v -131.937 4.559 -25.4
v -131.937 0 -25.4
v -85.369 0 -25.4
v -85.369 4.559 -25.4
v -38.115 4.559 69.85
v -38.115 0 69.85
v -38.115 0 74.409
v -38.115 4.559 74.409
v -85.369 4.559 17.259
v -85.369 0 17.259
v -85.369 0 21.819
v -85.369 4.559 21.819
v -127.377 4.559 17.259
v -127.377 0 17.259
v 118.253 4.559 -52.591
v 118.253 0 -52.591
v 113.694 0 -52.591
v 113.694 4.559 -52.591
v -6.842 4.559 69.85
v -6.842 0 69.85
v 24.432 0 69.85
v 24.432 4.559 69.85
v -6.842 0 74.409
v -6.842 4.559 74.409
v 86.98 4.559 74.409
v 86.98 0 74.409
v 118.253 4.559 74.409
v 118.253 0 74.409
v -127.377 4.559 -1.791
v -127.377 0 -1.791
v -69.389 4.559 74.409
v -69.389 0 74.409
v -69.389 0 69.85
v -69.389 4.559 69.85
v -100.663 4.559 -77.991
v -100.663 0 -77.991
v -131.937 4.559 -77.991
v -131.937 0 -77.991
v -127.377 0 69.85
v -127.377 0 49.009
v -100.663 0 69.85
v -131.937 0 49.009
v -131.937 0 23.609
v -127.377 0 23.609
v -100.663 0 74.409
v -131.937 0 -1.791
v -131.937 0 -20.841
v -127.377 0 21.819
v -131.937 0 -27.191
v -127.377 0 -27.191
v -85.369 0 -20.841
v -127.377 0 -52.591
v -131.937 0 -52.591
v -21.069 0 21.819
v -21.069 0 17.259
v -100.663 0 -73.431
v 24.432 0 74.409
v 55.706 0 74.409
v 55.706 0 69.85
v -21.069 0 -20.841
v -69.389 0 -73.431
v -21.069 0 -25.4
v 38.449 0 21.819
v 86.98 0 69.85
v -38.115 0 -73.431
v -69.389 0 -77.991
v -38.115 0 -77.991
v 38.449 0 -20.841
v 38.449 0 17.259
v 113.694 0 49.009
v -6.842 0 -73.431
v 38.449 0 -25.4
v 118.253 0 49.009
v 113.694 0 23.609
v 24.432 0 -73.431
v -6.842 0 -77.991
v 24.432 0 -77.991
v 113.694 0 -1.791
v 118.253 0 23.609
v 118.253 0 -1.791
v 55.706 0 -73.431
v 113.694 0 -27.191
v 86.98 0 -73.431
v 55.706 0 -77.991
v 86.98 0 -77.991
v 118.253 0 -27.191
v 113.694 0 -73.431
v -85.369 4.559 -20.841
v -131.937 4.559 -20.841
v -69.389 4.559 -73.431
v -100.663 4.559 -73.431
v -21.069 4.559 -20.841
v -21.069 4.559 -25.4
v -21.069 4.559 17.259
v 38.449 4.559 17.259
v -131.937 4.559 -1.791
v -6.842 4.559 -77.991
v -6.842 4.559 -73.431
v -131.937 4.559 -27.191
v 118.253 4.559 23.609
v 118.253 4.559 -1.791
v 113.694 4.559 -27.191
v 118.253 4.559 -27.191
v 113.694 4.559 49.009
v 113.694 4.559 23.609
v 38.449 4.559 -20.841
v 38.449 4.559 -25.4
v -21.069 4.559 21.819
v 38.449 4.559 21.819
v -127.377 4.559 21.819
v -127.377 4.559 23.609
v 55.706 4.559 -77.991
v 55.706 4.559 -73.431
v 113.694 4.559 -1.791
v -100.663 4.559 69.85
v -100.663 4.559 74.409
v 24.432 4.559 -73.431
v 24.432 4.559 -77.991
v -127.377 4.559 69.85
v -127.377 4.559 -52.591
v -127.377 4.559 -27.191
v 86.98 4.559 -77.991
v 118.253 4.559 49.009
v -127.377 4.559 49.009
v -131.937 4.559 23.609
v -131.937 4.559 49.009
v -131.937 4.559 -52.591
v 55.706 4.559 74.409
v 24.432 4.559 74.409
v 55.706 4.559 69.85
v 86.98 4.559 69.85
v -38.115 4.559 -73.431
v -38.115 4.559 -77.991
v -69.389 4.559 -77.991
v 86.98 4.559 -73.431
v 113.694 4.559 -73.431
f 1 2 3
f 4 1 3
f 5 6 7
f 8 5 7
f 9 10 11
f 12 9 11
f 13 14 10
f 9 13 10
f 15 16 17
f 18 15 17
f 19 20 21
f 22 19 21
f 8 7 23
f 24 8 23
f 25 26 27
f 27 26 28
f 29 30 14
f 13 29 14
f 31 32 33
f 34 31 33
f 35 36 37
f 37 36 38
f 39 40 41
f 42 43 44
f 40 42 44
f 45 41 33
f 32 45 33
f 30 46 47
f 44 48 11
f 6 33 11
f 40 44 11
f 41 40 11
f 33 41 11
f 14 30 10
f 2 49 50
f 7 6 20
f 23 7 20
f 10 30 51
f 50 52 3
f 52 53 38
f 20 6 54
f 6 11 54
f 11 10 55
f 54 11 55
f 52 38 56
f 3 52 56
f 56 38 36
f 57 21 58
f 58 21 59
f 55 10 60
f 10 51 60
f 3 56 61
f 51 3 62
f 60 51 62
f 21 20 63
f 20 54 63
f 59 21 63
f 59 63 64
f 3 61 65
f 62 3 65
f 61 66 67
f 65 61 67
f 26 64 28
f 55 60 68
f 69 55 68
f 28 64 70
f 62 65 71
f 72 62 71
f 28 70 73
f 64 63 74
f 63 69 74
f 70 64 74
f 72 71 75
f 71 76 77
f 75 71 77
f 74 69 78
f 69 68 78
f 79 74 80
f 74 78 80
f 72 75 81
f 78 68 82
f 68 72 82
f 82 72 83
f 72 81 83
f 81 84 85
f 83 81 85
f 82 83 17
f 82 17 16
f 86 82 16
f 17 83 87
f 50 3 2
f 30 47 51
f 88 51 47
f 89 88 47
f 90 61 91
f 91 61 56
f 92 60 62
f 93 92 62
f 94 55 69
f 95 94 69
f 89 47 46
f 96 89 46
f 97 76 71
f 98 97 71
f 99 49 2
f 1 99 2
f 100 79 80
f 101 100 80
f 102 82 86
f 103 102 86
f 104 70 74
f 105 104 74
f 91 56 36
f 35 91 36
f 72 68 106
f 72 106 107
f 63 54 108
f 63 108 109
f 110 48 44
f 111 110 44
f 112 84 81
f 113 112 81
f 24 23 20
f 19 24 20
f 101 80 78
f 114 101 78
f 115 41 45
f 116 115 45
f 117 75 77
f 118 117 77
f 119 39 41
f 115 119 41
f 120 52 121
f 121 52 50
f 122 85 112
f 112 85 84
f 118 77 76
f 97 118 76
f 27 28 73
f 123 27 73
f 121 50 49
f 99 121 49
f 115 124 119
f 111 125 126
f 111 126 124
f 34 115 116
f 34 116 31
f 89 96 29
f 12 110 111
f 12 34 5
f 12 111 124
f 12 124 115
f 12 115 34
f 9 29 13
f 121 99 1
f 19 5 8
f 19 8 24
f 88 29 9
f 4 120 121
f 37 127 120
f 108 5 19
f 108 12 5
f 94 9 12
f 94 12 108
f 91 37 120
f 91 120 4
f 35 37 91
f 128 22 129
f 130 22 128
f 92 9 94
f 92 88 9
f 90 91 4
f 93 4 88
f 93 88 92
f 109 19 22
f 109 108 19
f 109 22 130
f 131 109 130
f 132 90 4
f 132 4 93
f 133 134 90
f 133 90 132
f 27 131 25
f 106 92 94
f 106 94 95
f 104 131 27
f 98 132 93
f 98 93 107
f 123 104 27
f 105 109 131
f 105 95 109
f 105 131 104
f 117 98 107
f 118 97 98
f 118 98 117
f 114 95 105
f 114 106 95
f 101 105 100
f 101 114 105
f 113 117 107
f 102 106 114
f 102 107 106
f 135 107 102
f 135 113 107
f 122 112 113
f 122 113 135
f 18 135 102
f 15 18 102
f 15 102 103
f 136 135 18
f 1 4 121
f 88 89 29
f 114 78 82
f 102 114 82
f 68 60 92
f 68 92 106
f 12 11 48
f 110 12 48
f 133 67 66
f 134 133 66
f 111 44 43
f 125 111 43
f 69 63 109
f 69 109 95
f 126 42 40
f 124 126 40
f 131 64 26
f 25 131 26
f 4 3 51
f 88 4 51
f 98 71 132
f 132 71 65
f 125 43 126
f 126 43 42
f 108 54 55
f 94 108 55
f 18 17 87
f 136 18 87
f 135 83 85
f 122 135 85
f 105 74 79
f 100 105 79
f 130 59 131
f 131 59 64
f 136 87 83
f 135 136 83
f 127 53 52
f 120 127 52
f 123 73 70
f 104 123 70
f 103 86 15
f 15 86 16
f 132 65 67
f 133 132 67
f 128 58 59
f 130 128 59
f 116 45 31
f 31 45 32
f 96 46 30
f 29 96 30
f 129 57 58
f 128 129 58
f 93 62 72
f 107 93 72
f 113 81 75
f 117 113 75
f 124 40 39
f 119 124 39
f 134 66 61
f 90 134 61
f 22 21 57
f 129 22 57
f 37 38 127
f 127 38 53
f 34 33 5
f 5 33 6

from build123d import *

# Parameters (mm, degrees)
SKETCH1_W           = 59.517928736
SKETCH1_H           = 4.5593
BOSS_EXTRUDE1_DEPTH = 4.5593


with BuildPart() as part:
    # Sketch1 → Boss-Extrude1 (new body)
    with BuildSketch(Plane(origin=(0, 0, 0), x_dir=(1, 0, 0), z_dir=(0, 1, 0))):
        Polygon((-100.66298534, 77.9907), (-131.93673534, 77.9907), (-131.93673534, 52.5907), (-127.37743534, 52.5907), (-127.37743534, 27.1907), (-131.93673534, 27.1907), (-131.93673534, 25.4), (-85.368575998, 25.4), (-85.368575998, 20.8407), (-131.93673534, 20.8407), (-131.93673534, 1.7907), (-127.37743534, 1.7907), (-127.37743534, -17.2593), (-85.368575998, -17.2593), (-85.368575998, -21.8186), (-127.37743534, -21.8186), (-127.37743534, -23.6093), (-131.93673534, -23.6093), (-131.93673534, -49.0093), (-127.37743534, -49.0093), (-127.37743534, -69.85), (-100.66298534, -69.85), (-100.66298534, -74.4093), (-69.38923534, -74.4093), (-69.38923534, -69.85), (-38.11548534, -69.85), (-38.11548534, -74.4093), (-6.84173534, -74.4093), (-6.84173534, -69.85), (24.43201466, -69.85), (24.43201466, -74.4093), (55.70576466, -74.4093), (55.70576466, -69.85), (86.97951466, -69.85), (86.97951466, -74.4093), (118.25326466, -74.4093), (118.25326466, -49.0093), (113.69396466, -49.0093), (113.69396466, -23.6093), (118.25326466, -23.6093), (118.25326466, 1.7907), (113.69396466, 1.7907), (113.69396466, 27.1907), (118.25326466, 27.1907), (118.25326466, 52.5907), (113.69396466, 52.5907), (113.69396466, 73.4314), (86.97951466, 73.4314), (86.97951466, 77.9907), (55.70576466, 77.9907), (55.70576466, 73.4314), (24.43201466, 73.4314), (24.43201466, 77.9907), (-6.84173534, 77.9907), (-6.84173534, 73.4314), (-38.11548534, 73.4314), (-38.11548534, 77.9907), (-69.38923534, 77.9907), (-69.38923534, 73.4314), (-100.66298534, 73.4314), align=None)
        with Locations((8.690322735, -19.53895)):
            Rectangle(SKETCH1_W, SKETCH1_H, mode=Mode.SUBTRACT)
        with Locations((8.690322735, 23.12035)):
            Rectangle(SKETCH1_W, SKETCH1_H, mode=Mode.SUBTRACT)
    extrude(amount=BOSS_EXTRUDE1_DEPTH)


solid = part.part
